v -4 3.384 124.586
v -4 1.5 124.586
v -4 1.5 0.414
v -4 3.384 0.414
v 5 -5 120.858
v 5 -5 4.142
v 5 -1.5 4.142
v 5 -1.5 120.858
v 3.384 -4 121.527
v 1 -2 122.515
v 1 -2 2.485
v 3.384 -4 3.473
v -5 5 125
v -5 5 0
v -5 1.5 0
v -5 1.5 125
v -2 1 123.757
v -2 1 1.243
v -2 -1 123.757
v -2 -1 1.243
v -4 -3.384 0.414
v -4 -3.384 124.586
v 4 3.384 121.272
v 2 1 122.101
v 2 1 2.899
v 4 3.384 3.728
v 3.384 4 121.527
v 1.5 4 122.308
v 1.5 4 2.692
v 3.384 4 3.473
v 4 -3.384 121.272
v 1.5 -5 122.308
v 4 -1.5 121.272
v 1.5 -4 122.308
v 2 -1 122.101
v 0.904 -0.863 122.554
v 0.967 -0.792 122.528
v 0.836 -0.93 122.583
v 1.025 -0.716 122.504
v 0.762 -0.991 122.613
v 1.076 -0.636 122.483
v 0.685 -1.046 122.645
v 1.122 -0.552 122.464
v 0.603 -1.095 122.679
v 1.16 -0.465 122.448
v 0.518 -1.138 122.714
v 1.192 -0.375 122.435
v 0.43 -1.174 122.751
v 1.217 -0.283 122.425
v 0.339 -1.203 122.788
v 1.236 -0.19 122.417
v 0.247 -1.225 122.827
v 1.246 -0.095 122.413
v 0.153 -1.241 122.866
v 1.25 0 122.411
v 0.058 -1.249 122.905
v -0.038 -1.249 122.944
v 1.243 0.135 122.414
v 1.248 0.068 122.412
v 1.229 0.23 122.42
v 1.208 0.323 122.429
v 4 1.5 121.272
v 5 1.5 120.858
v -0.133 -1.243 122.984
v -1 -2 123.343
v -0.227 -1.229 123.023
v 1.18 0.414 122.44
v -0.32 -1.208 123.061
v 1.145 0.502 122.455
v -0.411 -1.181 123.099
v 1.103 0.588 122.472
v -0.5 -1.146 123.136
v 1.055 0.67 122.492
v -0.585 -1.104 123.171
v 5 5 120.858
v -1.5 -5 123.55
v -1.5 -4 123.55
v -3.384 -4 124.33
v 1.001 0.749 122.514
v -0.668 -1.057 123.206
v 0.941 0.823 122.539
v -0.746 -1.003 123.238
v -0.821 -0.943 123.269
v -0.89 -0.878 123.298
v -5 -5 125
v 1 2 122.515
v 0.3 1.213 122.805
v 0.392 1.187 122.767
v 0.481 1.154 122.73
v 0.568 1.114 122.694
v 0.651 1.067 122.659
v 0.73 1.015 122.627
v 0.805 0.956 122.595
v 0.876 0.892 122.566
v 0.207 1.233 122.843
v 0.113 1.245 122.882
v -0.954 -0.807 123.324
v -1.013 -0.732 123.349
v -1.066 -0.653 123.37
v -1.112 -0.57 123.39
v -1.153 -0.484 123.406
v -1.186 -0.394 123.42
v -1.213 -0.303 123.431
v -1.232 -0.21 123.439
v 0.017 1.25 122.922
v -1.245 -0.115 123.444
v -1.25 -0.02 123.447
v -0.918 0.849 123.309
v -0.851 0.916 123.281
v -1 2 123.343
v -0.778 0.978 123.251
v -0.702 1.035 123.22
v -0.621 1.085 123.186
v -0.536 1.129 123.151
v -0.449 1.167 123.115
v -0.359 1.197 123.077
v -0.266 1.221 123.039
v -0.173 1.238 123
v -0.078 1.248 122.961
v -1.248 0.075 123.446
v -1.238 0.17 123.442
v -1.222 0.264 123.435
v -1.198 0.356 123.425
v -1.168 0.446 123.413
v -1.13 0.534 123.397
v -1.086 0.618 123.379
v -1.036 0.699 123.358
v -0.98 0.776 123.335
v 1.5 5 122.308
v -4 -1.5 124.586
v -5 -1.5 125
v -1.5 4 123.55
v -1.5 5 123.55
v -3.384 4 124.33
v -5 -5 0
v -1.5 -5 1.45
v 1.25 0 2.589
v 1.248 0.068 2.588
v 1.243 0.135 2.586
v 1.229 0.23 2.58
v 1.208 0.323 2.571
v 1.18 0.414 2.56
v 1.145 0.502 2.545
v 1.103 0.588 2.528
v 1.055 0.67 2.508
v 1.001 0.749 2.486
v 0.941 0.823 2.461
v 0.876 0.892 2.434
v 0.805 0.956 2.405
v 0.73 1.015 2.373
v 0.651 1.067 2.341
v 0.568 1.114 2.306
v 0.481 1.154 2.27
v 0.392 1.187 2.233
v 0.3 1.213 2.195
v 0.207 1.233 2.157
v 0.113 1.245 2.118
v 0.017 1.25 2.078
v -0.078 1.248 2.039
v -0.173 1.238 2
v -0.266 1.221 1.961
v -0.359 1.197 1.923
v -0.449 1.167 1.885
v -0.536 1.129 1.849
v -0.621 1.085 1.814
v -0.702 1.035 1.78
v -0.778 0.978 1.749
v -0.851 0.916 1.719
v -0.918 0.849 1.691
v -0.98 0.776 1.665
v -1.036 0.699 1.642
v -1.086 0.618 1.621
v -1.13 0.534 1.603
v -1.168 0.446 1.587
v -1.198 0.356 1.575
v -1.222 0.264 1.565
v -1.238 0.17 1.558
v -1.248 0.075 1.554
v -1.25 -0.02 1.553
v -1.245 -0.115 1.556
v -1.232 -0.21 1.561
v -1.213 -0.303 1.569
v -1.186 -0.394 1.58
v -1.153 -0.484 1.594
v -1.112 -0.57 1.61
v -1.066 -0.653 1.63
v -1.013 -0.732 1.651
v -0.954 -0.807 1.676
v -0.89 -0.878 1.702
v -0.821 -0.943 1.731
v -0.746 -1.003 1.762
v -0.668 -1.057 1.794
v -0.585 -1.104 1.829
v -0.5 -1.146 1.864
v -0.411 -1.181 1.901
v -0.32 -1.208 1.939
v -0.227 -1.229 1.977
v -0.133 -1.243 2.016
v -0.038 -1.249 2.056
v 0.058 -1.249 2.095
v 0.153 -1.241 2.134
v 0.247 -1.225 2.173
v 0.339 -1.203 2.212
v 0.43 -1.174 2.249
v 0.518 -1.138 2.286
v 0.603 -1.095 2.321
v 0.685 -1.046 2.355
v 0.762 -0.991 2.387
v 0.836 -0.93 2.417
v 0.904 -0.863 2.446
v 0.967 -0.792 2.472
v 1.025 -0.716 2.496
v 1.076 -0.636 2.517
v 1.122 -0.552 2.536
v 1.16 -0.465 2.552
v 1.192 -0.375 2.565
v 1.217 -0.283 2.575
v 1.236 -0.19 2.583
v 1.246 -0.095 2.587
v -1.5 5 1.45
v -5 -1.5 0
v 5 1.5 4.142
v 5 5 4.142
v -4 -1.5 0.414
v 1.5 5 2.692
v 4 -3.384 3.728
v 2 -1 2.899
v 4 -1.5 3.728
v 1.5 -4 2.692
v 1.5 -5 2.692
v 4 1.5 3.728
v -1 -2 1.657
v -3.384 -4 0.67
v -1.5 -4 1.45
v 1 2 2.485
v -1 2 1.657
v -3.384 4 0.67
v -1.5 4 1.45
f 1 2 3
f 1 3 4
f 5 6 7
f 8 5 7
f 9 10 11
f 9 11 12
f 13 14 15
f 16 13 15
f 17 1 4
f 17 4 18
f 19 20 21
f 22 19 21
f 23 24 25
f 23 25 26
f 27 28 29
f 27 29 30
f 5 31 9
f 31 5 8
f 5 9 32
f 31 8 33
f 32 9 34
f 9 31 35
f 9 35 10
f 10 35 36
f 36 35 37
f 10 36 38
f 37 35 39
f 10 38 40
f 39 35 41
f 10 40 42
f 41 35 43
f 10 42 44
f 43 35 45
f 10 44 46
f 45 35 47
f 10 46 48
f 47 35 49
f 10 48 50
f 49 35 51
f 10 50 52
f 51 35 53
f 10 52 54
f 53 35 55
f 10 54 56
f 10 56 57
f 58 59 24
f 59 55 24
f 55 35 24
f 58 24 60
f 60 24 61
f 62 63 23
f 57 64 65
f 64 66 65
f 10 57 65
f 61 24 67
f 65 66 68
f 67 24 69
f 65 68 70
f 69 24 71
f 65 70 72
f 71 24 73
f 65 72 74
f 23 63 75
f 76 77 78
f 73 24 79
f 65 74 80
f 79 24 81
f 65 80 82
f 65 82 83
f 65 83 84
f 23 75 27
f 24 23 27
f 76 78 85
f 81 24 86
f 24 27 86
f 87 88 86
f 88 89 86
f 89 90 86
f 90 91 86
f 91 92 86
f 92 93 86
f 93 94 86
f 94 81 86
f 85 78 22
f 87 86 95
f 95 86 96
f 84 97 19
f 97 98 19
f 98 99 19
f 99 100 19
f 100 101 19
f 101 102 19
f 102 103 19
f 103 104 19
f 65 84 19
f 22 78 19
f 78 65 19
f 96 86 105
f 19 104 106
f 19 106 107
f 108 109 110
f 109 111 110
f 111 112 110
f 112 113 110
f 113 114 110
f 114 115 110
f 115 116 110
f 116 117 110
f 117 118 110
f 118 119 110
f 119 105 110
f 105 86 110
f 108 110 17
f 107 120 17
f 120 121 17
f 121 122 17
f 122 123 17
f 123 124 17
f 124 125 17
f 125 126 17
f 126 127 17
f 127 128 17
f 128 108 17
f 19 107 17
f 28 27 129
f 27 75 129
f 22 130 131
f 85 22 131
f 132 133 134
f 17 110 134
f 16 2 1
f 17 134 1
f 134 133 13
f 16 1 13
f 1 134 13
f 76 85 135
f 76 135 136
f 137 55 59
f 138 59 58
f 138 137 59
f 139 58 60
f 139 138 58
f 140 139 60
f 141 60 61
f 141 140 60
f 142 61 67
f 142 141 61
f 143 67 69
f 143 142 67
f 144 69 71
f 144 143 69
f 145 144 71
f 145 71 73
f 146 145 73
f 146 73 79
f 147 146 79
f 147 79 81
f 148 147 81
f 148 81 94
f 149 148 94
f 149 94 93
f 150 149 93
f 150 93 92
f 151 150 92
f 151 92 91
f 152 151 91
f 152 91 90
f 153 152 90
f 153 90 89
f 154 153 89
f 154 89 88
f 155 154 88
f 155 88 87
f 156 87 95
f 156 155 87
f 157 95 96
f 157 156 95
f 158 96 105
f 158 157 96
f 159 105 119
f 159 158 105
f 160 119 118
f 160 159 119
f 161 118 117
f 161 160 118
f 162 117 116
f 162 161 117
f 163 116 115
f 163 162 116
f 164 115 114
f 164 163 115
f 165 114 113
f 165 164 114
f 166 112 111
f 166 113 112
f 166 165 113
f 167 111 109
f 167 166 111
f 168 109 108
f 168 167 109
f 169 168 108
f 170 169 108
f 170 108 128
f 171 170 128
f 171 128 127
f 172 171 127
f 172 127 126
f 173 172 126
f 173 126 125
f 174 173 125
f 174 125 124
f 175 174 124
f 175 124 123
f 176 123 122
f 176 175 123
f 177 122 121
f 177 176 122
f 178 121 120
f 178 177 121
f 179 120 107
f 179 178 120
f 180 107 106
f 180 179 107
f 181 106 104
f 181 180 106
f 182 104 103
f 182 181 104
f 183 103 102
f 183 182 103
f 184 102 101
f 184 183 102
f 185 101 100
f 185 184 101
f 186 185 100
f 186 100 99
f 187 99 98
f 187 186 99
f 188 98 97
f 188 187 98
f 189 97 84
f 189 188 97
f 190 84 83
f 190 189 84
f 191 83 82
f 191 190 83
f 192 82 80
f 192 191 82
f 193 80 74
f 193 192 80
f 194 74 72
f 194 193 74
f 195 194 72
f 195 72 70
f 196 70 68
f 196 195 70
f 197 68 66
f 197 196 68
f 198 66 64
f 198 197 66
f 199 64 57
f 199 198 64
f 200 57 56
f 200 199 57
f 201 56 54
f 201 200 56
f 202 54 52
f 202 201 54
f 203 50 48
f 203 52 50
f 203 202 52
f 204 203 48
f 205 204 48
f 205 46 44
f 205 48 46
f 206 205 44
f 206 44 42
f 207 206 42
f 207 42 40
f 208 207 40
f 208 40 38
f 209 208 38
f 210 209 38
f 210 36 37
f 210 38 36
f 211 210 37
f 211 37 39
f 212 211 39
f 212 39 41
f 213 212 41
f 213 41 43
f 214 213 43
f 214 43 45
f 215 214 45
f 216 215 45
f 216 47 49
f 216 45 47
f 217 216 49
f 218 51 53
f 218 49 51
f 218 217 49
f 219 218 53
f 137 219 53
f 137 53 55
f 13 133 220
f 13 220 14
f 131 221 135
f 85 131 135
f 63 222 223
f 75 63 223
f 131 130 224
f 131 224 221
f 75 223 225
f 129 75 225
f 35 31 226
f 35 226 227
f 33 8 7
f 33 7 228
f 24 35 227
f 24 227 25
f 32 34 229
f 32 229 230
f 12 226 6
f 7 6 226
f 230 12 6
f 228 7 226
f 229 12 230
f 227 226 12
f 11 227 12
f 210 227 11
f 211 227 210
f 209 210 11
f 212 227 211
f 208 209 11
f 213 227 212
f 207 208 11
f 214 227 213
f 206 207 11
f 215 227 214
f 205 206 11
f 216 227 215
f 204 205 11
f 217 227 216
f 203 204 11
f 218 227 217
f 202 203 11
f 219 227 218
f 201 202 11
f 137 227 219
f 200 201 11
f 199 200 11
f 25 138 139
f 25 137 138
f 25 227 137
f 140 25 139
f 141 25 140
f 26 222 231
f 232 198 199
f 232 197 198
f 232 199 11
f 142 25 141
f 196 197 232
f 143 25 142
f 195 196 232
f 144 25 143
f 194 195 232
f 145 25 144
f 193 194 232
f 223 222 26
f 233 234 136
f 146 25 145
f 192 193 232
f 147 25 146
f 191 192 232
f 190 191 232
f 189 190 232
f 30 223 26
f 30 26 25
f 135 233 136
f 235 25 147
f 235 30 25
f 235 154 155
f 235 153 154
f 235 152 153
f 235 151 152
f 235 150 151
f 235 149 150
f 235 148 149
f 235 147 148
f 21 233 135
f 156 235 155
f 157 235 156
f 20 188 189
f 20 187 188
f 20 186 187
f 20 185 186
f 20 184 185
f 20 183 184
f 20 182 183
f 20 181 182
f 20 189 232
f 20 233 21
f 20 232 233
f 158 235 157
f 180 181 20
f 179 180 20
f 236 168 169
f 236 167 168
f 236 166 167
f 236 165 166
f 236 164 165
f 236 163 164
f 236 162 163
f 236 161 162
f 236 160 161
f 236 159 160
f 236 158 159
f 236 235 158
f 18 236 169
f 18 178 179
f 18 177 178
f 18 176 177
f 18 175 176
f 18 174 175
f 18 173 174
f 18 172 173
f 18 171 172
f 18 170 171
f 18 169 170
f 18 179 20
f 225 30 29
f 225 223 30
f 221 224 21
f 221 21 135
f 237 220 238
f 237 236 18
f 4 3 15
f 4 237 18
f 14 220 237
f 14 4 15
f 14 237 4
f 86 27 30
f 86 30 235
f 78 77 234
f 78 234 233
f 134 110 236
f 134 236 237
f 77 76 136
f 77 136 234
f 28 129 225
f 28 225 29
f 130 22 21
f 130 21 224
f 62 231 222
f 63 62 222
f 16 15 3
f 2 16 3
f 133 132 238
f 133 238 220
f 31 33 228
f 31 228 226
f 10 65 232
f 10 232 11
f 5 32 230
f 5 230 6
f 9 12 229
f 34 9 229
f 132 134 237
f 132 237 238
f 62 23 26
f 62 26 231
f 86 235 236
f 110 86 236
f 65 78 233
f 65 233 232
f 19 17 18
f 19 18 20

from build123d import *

# Parameters (mm, degrees)
ESQUISSE2_R             = 1.25
BOSS_EXTRU_1_DEPTH      = 125
ENL_V_MAT_EXTRU_1_DEPTH = 11


with BuildPart() as part:
    # Esquisse2 → Boss.-Extru.1 (new body)
    with BuildSketch(Plane.XY):
        Polygon((-1, -2), (1, -2), (3.383507185, -4), (1.5, -4), (1.5, -5), (5, -5), (5, -1.5), (4, -1.5), (4, -3.383507185), (2, -1), (2, 1), (4, 3.383507185), (4, 1.5), (5, 1.5), (5, 5), (1.5, 5), (1.5, 4), (3.383507185, 4), (1, 2), (-1, 2), (-3.383507185, 4), (-1.5, 4), (-1.5, 5), (-5, 5), (-5, 1.5), (-4, 1.5), (-4, 3.383507185), (-2, 1), (-2, -1), (-4, -3.383507185), (-4, -1.5), (-5, -1.5), (-5, -5), (-1.5, -5), (-1.5, -4), (-3.383507185, -4), align=None)
        Circle(ESQUISSE2_R, mode=Mode.SUBTRACT)
    extrude(amount=BOSS_EXTRU_1_DEPTH)

    # Esquisse3 → Enlèv. mat.-Extru.1 (cut, through all)
    with BuildSketch(Plane(origin=(0, 5, 0), x_dir=(1, 0, 0), z_dir=(0, 1, 0))):
        Polygon((-5, 0), (5, 0), (5, -4.142135624), align=None)
        Polygon((5, -120.857864376), (-5, -125), (5, -125), align=None)
    extrude(amount=-ENL_V_MAT_EXTRU_1_DEPTH, mode=Mode.SUBTRACT)


solid = part.part
